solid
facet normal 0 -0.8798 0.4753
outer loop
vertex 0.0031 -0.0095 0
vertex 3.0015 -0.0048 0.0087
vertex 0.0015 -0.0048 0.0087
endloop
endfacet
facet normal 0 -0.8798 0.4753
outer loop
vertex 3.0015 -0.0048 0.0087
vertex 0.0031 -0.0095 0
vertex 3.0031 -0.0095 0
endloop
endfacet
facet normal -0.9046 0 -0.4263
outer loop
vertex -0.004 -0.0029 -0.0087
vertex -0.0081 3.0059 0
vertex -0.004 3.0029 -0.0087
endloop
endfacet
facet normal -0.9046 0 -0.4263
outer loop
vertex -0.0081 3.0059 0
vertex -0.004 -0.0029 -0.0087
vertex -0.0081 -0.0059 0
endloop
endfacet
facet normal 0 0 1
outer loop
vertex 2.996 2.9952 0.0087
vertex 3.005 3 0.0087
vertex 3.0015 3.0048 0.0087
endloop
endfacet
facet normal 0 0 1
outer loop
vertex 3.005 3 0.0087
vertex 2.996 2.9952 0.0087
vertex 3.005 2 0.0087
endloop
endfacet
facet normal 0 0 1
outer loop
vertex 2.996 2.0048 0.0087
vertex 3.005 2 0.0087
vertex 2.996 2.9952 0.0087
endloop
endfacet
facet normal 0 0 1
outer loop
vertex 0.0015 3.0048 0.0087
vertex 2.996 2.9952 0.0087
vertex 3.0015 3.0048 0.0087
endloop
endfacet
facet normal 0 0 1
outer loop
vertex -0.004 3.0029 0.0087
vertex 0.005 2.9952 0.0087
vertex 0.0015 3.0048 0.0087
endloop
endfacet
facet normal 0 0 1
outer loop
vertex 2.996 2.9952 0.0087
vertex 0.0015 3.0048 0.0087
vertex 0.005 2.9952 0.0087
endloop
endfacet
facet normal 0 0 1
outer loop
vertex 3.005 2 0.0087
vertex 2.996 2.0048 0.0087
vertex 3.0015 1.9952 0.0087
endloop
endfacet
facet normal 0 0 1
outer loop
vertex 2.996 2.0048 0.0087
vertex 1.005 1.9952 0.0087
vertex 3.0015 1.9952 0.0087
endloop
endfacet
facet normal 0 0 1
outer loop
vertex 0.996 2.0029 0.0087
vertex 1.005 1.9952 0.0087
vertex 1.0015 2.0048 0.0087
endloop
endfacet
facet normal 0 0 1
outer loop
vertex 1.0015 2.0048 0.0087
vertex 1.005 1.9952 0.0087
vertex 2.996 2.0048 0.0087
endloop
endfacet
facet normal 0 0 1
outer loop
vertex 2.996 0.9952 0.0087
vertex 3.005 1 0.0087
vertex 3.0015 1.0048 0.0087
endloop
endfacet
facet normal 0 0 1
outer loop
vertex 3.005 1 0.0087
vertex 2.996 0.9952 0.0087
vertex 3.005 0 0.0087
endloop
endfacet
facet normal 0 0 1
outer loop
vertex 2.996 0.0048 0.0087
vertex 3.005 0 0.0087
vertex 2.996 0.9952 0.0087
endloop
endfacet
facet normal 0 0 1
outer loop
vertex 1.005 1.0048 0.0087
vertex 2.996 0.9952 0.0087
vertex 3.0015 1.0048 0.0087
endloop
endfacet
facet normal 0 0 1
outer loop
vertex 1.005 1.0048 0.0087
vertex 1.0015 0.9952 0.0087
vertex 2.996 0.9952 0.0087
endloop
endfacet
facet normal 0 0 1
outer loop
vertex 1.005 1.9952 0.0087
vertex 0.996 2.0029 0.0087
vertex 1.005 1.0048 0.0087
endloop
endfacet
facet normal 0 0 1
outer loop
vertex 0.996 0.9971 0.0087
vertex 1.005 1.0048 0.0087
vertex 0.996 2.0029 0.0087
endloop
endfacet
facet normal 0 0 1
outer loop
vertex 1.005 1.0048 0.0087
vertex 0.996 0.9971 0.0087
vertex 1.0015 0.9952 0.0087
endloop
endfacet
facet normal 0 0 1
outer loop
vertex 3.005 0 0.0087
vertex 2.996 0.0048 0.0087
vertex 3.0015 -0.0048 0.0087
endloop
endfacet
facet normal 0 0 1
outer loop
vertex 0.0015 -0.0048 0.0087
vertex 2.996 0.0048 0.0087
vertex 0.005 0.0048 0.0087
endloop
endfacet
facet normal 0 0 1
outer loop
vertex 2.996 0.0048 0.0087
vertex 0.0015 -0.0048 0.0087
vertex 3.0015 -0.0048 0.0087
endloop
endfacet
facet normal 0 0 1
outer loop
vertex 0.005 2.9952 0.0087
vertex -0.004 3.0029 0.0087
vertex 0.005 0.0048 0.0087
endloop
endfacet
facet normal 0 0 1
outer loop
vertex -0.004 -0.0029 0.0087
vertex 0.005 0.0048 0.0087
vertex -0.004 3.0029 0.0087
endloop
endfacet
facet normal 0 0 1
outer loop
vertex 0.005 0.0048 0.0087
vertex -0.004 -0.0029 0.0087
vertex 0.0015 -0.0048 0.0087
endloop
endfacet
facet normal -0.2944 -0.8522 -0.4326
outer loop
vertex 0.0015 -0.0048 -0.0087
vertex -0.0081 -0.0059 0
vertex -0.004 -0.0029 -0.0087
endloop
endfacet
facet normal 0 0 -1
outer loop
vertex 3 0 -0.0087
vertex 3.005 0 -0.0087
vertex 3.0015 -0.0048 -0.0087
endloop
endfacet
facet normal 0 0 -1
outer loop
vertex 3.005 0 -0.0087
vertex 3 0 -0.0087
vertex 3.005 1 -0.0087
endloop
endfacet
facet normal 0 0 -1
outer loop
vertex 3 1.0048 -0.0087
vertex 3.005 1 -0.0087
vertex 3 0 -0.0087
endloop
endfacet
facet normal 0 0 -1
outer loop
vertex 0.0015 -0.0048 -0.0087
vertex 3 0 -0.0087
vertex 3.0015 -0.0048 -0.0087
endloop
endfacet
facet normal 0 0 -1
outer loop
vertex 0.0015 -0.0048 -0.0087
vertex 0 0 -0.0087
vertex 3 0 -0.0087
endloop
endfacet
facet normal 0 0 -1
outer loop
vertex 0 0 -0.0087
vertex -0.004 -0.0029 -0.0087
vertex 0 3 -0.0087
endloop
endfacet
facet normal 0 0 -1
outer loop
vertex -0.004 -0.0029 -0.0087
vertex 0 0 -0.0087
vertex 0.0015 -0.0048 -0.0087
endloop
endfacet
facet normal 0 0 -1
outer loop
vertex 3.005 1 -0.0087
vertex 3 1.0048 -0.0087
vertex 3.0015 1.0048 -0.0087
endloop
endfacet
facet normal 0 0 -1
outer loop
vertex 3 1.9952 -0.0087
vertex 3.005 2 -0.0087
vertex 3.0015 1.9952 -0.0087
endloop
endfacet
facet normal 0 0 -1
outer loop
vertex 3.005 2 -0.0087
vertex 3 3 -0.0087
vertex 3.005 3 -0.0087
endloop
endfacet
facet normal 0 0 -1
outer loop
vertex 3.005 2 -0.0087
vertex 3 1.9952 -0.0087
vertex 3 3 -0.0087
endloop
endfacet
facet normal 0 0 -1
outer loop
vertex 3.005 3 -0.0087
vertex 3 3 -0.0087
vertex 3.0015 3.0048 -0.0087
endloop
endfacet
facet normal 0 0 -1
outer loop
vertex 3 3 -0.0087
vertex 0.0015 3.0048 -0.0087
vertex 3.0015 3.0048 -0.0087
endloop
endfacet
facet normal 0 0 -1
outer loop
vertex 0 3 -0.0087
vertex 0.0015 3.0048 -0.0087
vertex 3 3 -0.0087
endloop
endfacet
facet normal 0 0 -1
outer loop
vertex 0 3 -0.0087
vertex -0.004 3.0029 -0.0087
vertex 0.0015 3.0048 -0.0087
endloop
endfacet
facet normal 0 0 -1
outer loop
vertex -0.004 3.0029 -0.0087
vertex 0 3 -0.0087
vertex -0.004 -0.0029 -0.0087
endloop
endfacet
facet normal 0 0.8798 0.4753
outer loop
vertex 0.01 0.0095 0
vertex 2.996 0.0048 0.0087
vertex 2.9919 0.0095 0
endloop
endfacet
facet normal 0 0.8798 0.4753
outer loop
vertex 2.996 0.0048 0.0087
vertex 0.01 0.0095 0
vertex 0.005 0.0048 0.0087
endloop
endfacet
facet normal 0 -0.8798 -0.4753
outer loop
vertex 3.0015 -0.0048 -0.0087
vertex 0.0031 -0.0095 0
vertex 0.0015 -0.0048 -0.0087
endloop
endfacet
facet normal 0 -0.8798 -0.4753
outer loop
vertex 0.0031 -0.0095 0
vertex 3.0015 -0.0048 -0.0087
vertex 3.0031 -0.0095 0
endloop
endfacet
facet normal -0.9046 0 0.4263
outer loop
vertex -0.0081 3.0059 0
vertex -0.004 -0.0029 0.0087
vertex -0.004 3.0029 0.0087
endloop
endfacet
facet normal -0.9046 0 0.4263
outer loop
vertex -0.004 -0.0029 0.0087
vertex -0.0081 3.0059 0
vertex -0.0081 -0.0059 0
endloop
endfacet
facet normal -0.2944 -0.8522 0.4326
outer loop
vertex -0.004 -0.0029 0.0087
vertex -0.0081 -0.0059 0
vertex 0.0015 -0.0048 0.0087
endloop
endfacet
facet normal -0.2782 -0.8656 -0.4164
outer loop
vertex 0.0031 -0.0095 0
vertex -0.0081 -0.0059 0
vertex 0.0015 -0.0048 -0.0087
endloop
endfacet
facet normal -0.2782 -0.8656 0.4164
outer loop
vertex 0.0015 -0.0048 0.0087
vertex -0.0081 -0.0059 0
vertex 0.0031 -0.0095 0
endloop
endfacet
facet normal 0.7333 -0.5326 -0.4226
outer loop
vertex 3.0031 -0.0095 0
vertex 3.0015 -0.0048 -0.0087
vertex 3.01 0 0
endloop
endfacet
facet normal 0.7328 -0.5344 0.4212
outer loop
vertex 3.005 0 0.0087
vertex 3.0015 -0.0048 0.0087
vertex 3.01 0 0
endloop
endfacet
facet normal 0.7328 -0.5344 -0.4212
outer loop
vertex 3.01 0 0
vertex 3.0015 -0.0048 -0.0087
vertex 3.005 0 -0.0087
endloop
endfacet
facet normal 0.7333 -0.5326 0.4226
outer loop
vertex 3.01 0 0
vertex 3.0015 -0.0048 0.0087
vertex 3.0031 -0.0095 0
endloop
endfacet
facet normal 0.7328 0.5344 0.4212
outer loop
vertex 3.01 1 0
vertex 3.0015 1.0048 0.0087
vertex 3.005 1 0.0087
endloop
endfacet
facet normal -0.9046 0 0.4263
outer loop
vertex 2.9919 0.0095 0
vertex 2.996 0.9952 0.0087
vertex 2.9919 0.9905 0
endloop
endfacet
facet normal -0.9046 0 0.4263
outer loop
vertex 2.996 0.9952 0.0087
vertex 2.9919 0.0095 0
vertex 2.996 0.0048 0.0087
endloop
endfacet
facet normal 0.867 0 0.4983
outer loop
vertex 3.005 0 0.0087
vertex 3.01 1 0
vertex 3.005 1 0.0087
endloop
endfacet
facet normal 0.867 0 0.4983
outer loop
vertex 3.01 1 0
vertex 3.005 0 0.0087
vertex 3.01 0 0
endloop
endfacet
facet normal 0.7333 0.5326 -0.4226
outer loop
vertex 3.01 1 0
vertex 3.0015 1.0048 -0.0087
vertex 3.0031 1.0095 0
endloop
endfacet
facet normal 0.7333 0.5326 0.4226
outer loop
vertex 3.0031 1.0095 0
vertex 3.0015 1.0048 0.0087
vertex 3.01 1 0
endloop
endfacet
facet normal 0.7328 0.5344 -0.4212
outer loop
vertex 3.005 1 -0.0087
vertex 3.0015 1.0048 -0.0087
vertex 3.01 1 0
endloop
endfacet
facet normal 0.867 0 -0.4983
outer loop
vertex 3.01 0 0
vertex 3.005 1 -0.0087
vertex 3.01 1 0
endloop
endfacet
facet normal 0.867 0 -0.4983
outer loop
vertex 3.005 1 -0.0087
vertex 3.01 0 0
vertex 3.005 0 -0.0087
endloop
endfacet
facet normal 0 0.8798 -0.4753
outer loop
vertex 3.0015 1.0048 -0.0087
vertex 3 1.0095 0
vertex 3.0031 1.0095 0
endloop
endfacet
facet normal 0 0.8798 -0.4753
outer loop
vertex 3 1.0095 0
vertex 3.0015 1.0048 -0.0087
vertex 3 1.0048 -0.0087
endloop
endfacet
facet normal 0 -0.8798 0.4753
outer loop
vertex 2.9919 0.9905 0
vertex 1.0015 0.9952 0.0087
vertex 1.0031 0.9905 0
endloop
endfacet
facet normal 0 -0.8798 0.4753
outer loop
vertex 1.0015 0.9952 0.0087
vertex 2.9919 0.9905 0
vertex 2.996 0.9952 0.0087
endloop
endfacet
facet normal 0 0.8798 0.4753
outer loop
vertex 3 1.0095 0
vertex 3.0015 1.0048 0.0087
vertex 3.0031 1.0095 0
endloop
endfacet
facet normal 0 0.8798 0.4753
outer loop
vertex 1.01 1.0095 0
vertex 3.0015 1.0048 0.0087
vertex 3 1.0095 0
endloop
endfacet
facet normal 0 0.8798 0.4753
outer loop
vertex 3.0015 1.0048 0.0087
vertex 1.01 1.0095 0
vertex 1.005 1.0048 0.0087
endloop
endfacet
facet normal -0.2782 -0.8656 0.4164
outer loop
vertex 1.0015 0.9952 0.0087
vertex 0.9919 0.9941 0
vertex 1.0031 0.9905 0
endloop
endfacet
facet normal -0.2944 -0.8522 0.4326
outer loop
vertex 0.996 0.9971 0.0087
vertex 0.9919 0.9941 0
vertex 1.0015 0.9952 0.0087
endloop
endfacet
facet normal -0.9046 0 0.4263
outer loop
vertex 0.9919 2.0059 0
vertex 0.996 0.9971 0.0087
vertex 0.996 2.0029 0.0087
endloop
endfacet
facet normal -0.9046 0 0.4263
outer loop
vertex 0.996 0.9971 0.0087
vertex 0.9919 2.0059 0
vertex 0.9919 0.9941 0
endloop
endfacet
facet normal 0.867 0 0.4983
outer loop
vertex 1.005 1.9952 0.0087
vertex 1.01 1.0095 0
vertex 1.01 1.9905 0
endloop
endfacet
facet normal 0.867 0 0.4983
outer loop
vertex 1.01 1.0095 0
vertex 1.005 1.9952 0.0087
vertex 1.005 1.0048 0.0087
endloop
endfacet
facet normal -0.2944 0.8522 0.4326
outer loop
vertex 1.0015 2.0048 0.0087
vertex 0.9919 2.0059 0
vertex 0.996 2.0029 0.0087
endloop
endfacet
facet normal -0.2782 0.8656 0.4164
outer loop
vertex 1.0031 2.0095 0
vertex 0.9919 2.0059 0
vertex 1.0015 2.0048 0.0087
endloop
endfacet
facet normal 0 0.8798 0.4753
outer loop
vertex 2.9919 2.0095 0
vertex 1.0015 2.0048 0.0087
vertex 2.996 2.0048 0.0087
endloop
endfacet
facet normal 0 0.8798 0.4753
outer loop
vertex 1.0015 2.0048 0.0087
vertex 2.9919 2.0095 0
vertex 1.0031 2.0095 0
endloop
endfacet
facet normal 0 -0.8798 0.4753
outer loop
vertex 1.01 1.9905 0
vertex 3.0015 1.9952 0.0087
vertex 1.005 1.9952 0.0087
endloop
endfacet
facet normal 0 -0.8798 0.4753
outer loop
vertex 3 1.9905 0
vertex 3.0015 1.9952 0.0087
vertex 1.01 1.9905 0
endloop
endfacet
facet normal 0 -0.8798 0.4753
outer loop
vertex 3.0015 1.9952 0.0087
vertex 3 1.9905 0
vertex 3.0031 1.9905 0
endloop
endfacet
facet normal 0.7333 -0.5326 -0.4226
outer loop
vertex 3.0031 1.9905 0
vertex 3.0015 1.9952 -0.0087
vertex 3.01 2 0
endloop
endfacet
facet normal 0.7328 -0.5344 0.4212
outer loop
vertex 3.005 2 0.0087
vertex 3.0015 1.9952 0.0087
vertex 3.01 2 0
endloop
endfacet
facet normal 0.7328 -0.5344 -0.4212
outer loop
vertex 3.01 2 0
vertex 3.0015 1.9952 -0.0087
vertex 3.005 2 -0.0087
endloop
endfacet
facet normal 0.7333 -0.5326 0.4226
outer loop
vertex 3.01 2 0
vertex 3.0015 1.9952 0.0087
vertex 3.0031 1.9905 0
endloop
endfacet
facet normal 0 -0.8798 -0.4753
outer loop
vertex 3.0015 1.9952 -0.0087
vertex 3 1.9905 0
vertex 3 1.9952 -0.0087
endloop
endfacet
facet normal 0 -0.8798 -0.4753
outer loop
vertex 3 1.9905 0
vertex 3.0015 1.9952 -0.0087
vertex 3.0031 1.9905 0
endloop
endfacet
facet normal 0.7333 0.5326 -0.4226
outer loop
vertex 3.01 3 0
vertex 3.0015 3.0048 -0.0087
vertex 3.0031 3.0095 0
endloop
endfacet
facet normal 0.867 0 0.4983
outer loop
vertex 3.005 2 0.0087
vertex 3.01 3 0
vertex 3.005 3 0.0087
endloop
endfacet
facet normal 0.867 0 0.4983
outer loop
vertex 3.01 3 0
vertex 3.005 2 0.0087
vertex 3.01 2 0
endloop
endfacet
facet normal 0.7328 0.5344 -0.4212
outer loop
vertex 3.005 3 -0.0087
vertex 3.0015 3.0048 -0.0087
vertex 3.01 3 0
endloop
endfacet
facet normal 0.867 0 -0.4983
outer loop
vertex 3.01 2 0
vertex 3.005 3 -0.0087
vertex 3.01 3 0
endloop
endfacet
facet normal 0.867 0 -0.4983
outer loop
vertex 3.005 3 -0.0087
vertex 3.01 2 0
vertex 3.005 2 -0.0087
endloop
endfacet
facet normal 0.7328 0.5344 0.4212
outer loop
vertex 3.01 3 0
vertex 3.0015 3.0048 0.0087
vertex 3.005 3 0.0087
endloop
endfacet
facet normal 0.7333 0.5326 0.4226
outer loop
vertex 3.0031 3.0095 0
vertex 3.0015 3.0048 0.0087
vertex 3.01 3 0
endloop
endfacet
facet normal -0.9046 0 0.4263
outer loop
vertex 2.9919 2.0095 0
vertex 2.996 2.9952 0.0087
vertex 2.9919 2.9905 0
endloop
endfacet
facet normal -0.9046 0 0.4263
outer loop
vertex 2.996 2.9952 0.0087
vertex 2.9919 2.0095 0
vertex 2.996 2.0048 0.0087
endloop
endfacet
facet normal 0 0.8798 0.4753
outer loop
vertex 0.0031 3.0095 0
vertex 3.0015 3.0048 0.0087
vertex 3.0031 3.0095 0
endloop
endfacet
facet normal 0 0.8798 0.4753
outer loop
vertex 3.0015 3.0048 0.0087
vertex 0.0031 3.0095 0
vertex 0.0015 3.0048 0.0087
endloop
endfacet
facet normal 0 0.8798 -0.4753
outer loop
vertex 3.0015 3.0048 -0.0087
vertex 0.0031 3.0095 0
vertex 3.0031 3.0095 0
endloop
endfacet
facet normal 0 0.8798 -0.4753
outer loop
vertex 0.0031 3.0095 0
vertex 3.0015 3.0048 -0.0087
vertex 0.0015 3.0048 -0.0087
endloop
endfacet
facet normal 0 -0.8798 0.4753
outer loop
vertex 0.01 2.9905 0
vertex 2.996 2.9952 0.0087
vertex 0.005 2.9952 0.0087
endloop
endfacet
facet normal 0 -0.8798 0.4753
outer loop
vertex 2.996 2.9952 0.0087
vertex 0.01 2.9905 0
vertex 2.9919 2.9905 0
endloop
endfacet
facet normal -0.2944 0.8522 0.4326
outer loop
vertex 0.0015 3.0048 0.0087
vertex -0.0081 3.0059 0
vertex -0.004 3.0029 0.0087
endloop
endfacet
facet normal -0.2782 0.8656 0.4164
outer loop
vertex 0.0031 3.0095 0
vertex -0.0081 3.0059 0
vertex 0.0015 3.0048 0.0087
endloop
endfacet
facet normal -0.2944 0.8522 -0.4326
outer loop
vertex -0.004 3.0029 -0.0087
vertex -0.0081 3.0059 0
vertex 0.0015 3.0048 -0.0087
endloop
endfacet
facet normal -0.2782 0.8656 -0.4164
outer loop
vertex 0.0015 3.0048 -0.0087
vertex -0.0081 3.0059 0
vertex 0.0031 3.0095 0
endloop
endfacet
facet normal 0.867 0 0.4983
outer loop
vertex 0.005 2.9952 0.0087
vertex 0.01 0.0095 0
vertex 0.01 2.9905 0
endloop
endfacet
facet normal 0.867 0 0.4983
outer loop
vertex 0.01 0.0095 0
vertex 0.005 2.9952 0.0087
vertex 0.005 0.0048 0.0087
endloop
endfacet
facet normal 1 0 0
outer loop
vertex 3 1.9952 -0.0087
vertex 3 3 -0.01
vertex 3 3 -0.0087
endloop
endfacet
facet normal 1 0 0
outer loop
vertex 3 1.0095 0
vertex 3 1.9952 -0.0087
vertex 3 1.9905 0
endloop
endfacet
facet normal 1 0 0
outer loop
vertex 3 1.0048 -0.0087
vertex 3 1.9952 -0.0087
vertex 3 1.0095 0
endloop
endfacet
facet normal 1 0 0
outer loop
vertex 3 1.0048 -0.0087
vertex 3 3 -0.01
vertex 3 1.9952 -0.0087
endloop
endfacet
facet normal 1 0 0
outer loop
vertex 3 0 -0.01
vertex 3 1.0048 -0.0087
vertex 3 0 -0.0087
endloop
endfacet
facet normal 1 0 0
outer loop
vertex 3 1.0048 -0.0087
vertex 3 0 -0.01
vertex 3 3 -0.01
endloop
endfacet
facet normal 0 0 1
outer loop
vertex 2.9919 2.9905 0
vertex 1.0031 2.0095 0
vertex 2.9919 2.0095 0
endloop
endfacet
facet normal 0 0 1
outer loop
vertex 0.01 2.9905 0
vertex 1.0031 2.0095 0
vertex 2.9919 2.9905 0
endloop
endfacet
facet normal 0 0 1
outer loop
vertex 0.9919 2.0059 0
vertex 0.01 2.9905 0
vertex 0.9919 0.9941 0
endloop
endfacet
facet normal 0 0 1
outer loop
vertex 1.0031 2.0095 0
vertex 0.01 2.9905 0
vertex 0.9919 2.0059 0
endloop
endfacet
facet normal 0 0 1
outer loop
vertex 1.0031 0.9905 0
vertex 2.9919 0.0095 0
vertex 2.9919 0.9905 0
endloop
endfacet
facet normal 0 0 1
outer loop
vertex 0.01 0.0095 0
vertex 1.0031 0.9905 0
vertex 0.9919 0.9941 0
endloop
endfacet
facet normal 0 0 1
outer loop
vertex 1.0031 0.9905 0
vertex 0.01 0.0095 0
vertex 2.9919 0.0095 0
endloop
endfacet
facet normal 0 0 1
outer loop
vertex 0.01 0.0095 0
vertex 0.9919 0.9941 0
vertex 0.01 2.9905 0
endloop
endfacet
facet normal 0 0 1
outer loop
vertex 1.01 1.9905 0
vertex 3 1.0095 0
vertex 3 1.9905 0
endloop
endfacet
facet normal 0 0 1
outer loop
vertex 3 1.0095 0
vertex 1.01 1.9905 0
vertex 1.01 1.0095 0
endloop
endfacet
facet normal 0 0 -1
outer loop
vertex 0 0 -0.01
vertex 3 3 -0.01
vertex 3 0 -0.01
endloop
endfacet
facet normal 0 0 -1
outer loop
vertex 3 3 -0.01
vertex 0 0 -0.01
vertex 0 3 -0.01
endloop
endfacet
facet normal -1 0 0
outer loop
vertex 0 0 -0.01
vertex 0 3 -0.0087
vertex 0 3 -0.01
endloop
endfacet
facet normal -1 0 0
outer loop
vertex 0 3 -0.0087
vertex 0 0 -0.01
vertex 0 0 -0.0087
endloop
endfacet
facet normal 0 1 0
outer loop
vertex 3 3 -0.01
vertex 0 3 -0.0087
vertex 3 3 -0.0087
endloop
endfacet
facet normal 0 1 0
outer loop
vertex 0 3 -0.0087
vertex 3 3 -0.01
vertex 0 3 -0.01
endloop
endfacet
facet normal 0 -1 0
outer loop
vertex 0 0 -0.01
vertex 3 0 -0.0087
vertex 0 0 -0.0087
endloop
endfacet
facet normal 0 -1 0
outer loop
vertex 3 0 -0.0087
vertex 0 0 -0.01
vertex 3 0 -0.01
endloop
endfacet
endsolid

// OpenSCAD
hull(){
    translate([0, 0]) sphere(0.01);
    translate([1, 0]) sphere(0.01);
}
hull(){
    translate([1, 0]) sphere(0.01);
    translate([2, 0]) sphere(0.01);
}
hull(){
    translate([2, 0]) sphere(0.01);
    translate([3, 0]) sphere(0.01);
}
hull(){
    translate([3, 0]) sphere(0.01);
    translate([3, 1]) sphere(0.01);
}
hull(){
    translate([3, 1]) sphere(0.01);
    translate([2, 1]) sphere(0.01);
}
hull(){
    translate([2, 1]) sphere(0.01);
    translate([1, 1]) sphere(0.01);
}
hull(){
    translate([1, 1]) sphere(0.01);
    translate([1, 2]) sphere(0.01);
}
hull(){
    translate([1, 2]) sphere(0.01);
    translate([2, 2]) sphere(0.01);
}
hull(){
    translate([2, 2]) sphere(0.01);
    translate([3, 2]) sphere(0.01);
}
hull(){
    translate([3, 2]) sphere(0.01);
    translate([3, 3]) sphere(0.01);
}
hull(){
    translate([3, 3]) sphere(0.01);
    translate([2, 3]) sphere(0.01);
}
hull(){
    translate([2, 3]) sphere(0.01);
    translate([1, 3]) sphere(0.01);
}
hull(){
    translate([1, 3]) sphere(0.01);
    translate([0, 3]) sphere(0.01);
}
hull(){
    translate([0, 3]) sphere(0.01);
    translate([0, 2]) sphere(0.01);
}
hull(){
    translate([0, 2]) sphere(0.01);
    translate([0, 1]) sphere(0.01);
}
hull(){
    translate([0, 1]) sphere(0.01);
    translate([0, 0]) sphere(0.01);
}
translate([0,0,-0.01]) color([0.1,0.1,0.1]) cube([3,3,0.01]);
